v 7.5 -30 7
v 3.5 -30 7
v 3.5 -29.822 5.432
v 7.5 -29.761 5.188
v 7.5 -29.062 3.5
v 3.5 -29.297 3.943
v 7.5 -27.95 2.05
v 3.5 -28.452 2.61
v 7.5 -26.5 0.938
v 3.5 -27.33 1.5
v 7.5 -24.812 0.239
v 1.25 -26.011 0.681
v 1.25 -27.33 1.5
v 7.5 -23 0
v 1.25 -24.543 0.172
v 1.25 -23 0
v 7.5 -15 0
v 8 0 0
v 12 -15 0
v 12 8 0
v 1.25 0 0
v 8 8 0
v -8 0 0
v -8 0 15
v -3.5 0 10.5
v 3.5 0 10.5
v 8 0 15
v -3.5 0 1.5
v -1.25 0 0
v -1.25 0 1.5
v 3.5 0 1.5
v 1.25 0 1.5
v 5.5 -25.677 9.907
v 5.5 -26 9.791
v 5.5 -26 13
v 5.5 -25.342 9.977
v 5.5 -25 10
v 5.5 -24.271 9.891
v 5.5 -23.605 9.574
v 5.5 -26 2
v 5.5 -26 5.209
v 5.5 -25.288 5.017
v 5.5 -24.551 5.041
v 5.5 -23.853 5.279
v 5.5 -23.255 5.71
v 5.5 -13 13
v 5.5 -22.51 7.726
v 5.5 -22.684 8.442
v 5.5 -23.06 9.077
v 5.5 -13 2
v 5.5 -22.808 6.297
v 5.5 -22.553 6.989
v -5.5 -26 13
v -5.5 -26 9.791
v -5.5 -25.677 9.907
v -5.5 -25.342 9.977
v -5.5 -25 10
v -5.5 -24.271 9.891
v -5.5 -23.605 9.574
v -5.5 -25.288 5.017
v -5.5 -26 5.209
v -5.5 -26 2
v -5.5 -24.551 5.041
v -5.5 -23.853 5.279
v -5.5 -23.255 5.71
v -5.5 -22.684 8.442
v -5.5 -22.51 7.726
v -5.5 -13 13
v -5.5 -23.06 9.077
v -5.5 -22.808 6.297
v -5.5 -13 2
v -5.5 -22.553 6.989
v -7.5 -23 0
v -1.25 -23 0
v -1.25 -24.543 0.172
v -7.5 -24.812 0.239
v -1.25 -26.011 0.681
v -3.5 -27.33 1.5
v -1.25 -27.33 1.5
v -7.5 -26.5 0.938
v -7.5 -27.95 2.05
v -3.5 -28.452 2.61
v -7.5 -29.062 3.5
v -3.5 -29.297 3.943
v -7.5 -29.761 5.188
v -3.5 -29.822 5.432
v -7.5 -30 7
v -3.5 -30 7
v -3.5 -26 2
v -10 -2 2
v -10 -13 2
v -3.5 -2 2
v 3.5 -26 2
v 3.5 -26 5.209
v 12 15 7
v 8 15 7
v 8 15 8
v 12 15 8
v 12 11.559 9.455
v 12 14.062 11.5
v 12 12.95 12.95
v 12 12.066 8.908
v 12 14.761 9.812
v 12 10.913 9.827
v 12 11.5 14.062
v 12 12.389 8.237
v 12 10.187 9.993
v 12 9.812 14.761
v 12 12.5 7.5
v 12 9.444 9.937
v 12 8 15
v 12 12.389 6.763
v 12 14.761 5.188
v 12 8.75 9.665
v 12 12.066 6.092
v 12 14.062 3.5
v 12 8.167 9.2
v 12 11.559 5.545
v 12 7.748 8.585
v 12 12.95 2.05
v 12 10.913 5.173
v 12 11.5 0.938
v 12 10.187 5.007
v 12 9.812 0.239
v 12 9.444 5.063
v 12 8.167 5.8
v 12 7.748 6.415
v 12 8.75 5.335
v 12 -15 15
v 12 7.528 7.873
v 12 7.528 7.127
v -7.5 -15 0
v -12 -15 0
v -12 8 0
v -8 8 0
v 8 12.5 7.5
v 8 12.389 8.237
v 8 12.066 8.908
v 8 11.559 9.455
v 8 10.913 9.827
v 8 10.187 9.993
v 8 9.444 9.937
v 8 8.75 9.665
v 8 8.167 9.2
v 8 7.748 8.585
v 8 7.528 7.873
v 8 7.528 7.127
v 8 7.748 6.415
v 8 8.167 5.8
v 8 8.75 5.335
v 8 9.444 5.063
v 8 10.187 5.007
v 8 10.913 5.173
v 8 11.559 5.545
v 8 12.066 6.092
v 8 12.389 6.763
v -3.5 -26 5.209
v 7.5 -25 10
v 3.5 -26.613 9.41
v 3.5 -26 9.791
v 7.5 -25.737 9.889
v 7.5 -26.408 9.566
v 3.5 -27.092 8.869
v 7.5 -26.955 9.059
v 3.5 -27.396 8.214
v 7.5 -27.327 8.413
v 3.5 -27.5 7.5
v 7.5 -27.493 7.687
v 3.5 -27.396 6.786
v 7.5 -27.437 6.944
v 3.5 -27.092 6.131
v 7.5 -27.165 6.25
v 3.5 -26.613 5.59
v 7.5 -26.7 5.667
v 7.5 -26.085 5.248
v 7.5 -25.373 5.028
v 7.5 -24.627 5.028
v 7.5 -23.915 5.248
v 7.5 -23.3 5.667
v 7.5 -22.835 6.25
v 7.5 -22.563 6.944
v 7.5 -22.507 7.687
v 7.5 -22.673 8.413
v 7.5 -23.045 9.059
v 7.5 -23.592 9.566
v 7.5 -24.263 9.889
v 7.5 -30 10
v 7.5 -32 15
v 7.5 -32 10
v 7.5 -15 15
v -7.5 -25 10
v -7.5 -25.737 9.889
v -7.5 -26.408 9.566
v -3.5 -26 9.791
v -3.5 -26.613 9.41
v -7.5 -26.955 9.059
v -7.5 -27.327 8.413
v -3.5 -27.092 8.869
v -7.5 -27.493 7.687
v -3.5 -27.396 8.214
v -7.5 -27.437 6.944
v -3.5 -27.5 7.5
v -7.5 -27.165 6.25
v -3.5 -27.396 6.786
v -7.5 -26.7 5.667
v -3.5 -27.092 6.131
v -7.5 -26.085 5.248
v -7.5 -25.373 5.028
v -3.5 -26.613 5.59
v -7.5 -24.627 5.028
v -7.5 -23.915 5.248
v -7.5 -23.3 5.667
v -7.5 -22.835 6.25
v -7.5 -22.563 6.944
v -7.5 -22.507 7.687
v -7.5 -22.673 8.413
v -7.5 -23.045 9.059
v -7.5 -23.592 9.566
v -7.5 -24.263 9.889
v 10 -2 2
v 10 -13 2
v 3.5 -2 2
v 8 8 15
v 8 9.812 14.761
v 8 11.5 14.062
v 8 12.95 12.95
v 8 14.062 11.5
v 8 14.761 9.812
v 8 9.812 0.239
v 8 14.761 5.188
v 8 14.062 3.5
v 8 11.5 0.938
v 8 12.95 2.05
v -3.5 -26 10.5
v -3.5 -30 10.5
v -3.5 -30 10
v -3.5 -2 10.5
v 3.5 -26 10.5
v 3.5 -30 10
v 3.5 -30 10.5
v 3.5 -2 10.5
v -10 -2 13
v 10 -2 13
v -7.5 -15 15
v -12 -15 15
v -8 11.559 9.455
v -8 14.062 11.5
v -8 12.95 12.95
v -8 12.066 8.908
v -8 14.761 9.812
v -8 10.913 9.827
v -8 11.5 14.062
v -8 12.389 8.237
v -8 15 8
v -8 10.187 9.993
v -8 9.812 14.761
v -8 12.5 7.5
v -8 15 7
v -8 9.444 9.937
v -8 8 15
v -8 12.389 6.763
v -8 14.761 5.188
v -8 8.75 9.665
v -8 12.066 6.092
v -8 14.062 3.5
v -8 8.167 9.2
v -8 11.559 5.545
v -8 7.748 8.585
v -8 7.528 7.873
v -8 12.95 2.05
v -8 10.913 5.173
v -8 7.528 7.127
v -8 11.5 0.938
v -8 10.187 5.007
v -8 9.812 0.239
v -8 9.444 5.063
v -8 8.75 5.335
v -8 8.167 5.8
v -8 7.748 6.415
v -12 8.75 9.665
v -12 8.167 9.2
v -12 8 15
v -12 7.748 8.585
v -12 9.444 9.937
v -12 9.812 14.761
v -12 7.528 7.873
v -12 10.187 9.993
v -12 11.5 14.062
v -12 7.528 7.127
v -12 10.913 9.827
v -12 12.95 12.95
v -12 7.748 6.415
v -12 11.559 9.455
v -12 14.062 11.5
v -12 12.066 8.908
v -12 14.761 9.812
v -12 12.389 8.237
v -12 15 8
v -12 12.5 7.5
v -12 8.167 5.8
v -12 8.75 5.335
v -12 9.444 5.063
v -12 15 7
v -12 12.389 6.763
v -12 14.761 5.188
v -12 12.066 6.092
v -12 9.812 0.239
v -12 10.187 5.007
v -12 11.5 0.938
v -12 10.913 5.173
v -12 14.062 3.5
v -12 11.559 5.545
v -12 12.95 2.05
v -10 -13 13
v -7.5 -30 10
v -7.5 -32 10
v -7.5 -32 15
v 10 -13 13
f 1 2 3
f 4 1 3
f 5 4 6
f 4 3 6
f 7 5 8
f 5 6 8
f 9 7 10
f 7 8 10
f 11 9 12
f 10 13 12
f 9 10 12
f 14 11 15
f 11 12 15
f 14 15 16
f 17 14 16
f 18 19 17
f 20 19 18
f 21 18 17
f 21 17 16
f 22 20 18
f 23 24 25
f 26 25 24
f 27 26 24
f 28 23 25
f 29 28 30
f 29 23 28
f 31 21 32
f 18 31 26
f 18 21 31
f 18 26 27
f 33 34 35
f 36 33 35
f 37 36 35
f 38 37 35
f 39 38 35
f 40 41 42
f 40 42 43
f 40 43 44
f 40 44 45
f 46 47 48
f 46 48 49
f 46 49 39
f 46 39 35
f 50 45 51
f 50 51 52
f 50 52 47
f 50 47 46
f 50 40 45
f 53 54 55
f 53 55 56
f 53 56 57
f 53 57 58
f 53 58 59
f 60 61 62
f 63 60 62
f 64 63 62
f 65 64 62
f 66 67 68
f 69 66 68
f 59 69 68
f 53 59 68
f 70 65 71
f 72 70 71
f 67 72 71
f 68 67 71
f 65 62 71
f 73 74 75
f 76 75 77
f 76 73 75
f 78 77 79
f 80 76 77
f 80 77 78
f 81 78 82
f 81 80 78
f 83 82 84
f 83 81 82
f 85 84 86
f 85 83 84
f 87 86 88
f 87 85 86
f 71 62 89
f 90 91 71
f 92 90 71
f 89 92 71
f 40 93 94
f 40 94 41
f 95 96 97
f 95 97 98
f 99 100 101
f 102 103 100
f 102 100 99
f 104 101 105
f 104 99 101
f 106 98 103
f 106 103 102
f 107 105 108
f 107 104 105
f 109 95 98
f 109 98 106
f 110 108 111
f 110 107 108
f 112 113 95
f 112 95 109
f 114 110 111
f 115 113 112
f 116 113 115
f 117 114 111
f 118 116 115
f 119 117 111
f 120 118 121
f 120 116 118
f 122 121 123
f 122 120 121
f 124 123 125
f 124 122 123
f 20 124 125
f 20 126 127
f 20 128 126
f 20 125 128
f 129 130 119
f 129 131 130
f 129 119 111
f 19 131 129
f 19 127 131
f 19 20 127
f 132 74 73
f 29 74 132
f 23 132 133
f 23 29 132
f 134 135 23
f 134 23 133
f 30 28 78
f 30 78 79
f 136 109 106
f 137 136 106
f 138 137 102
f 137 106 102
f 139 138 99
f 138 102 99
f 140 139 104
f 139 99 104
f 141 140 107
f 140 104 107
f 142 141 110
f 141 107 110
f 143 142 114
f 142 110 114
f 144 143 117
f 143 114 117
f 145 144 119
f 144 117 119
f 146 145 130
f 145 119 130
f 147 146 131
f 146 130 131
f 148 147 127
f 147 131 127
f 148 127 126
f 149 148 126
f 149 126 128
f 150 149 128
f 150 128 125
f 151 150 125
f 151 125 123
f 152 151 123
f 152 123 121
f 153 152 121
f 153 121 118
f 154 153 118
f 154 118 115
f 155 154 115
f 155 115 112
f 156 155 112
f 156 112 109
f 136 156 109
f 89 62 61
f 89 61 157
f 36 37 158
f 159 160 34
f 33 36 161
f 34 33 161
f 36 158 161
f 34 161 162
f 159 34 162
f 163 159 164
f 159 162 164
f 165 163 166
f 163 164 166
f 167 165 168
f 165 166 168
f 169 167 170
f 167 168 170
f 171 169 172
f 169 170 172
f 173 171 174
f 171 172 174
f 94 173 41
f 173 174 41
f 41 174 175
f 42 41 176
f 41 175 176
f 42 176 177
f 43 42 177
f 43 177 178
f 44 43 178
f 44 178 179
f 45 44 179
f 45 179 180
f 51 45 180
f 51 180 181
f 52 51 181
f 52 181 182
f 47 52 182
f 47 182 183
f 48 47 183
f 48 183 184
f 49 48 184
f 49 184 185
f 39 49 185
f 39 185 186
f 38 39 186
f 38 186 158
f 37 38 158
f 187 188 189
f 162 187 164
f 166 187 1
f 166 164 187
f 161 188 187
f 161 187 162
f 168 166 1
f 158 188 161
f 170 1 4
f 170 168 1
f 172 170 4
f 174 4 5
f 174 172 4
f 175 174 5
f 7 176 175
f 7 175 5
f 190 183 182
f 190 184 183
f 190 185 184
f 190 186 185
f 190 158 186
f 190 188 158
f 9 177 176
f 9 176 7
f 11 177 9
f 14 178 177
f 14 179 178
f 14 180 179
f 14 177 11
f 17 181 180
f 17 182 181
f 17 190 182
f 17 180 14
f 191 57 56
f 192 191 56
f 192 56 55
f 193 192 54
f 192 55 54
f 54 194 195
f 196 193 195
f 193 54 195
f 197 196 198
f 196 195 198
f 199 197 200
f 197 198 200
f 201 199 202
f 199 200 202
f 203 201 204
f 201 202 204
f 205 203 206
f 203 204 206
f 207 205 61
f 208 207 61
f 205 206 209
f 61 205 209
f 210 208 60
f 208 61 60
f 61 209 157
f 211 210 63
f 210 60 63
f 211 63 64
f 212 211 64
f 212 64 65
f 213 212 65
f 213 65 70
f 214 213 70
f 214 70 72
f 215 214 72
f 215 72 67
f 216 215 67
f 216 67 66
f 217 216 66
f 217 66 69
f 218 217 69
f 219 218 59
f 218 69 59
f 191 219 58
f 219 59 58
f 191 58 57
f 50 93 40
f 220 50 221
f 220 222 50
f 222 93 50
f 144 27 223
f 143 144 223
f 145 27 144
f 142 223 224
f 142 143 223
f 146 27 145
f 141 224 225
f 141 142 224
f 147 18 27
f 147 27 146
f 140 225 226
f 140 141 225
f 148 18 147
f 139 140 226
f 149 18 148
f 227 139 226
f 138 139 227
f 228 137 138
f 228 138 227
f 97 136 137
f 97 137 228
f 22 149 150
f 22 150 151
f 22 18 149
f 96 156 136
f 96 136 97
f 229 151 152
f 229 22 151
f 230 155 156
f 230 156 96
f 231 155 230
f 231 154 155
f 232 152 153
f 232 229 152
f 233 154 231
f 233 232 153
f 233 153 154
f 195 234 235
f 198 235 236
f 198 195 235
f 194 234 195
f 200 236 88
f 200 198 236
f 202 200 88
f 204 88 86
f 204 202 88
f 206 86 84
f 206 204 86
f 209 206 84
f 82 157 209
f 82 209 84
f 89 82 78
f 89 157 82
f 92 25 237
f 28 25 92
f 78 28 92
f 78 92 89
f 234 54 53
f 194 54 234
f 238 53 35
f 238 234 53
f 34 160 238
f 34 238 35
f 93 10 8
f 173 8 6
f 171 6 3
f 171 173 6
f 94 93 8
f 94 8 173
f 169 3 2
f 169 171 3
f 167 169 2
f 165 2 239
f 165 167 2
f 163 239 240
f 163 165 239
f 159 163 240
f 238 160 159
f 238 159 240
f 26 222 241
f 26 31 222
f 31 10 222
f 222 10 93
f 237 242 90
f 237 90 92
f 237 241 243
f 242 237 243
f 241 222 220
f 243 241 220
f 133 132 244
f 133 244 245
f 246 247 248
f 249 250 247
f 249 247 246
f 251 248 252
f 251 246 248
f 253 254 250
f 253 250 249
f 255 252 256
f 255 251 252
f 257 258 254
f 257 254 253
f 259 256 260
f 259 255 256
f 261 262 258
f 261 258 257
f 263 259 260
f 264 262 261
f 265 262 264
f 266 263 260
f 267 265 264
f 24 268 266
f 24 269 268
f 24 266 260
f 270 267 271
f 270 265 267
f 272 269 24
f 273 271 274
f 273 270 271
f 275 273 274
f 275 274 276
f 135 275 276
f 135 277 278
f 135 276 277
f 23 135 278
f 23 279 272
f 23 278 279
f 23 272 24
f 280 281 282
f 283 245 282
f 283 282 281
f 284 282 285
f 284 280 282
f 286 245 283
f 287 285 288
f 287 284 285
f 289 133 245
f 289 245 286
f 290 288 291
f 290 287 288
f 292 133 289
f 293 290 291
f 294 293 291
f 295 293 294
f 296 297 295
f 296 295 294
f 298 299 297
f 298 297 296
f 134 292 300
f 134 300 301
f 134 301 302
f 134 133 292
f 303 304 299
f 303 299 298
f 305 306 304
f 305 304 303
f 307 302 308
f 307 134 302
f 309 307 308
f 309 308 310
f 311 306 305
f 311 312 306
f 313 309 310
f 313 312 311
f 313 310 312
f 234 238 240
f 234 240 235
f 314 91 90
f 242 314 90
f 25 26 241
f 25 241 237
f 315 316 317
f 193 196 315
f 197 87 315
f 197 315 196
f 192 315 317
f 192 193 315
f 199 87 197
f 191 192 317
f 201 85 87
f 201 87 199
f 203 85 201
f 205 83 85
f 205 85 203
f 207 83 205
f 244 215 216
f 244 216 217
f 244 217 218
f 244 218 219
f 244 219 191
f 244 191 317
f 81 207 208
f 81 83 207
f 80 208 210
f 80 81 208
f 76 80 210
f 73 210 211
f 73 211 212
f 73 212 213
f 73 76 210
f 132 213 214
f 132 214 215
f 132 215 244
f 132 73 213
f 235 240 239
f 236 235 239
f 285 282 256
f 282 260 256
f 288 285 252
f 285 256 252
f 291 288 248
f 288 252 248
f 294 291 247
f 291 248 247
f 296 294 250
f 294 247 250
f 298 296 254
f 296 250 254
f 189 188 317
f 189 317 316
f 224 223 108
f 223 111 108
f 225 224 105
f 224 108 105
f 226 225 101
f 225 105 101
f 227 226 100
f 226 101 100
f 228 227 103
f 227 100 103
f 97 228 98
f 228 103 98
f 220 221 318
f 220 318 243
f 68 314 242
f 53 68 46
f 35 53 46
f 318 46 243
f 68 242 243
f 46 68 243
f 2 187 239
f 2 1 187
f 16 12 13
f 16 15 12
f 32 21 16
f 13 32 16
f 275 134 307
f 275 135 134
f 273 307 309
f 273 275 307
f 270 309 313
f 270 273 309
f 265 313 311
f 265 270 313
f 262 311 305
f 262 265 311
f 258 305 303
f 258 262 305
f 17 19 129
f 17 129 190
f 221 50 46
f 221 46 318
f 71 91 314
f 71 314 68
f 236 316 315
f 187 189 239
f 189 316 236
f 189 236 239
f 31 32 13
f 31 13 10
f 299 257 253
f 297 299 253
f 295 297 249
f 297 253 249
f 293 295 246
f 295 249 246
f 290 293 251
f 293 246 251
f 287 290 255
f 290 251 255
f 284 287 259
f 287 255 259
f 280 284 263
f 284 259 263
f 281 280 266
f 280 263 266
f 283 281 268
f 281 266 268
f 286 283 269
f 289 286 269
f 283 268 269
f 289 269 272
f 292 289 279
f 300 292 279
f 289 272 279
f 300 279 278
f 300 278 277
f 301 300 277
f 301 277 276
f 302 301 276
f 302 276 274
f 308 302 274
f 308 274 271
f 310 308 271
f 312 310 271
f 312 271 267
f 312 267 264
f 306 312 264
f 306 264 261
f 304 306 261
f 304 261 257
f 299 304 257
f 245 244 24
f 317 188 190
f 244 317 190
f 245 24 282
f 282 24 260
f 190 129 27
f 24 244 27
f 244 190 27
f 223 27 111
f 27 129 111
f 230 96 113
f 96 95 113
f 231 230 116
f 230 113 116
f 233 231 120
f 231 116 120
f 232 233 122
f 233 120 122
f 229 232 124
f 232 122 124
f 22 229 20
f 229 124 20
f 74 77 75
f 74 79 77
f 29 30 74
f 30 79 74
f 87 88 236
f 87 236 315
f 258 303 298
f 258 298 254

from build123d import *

# Parameters (mm, degrees)
SKETCH1_W           = 20
SKETCH1_H           = 11
SKETCH1_W_2         = 11
SKETCH1_H_2         = 13
BOSS_EXTRUDE1_DEPTH = 15
SKETCH2_R           = 2.5
CUT_EXTRUDE1_DEPTH  = 36
CUT_EXTRUDE2_DEPTH  = 36
CUT_EXTRUDE3_START  = 2
SKETCH1_3_W         = 20
SKETCH1_3_H         = 11
SKETCH1_3_W_2       = 11
SKETCH1_3_H_2       = 13
CUT_EXTRUDE3_DEPTH  = 11
FILLET4_R           = 7
BOSS_EXTRUDE2_REACH = 40.798
SKETCH5_W           = 5
SKETCH5_H           = 2


with BuildPart() as part:
    # Sketch1 → Boss-Extrude1 (new body)
    # profile 1 of 3: a face of its own
    with BuildSketch(Plane.XY):
        Polygon((-12, -15), (-12, 15), (-8, 15), (-8, 0), (8, 0), (8, 15), (12, 15), (12, -15), (7.5, -15), (7.5, -30), (-7.5, -30), (-7.5, -15), align=None)
        with Locations((0, -7.5)):
            Rectangle(SKETCH1_W, SKETCH1_H, mode=Mode.SUBTRACT)
    # profile 2 of 3: a face of its own
    with BuildSketch(Plane.XY):
        with Locations((0, -7.5)):
            Rectangle(SKETCH1_W, SKETCH1_H)
    # profile 3 of 3: a face of its own
    with BuildSketch(Plane.XY):
        with Locations((0, -19.5)):
            Rectangle(SKETCH1_W_2, SKETCH1_H_2)
    extrude(amount=BOSS_EXTRUDE1_DEPTH)

    # Sketch2 → Cut-Extrude1 (cut)
    with BuildSketch(Plane(origin=(12, 0, 0), x_dir=(0, 0, -1), z_dir=(1, 0, 0))):
        with Locations(Location((-7.5, 10, 0), (0, 0, 90))):
            Circle(SKETCH2_R)
        with Locations(Location((-7.5, -25, 0), (0, 0, 180))):
            Circle(SKETCH2_R)
    extrude(amount=-CUT_EXTRUDE1_DEPTH, mode=Mode.SUBTRACT)

    # Sketch3 → Cut-Extrude2 (cut)
    with BuildSketch(Plane(origin=(0, 0, 0), x_dir=(1, 0, 0), z_dir=(0, 1, 0))):
        Polygon((-1.25, 0), (1.25, 0), (1.25, -1.5), (3.5, -1.5), (3.5, -10.5), (-3.5, -10.5), (-3.5, -1.5), (-1.25, -1.5), align=None)
    extrude(amount=-CUT_EXTRUDE2_DEPTH, mode=Mode.SUBTRACT)

    # Sketch1<3> → Cut-Extrude3 (cut)
    with BuildSketch(Plane.XY.offset(CUT_EXTRUDE3_START)):
        with Locations((0, -7.5)):
            Rectangle(SKETCH1_3_W, SKETCH1_3_H)
        with Locations((0, -19.5)):
            Rectangle(SKETCH1_3_W_2, SKETCH1_3_H_2)
    extrude(amount=CUT_EXTRUDE3_DEPTH, mode=Mode.SUBTRACT)

    # Fillet4
    fillet4_edges = [part.edges().sort_by_distance(p)[0] for p in [
        (10, 15, 15),
        (10, 15, 0),
        (-10, 15, 15),
        (-10, 15, 0),
        (4.375, -30, 0),
        (-4.375, -30, 0),
    ]]
    fillet(fillet4_edges, radius=FILLET4_R)

    # Boss-Extrude2: up to this face of the body (flat: up to its plane)
    boss_extrude2_end = Plane(part.part.faces().sort_by_distance((-7.5, -21.9277031, 7.820372358))[0])
    # Sketch5 → Boss-Extrude2 (add, up to the picked face)
    with BuildSketch(Plane(origin=(7.5, 0, 0), x_dir=(0, 0, -1), z_dir=(1, 0, 0)), mode=Mode.PRIVATE) as boss_extrude2_sk1:
        with Locations((-12.5, -31)):
            Rectangle(SKETCH5_W, SKETCH5_H)
    boss_extrude2_tool1 = split(extrude(boss_extrude2_sk1.sketch, amount=-BOSS_EXTRUDE2_REACH, mode=Mode.PRIVATE), bisect_by=boss_extrude2_end, keep=Keep.BOTH, mode=Mode.PRIVATE)
    add(boss_extrude2_tool1.solids().sort_by(Axis((7.5, -31, 12.5), (-1, 0, 0)))[0])


solid = part.part
